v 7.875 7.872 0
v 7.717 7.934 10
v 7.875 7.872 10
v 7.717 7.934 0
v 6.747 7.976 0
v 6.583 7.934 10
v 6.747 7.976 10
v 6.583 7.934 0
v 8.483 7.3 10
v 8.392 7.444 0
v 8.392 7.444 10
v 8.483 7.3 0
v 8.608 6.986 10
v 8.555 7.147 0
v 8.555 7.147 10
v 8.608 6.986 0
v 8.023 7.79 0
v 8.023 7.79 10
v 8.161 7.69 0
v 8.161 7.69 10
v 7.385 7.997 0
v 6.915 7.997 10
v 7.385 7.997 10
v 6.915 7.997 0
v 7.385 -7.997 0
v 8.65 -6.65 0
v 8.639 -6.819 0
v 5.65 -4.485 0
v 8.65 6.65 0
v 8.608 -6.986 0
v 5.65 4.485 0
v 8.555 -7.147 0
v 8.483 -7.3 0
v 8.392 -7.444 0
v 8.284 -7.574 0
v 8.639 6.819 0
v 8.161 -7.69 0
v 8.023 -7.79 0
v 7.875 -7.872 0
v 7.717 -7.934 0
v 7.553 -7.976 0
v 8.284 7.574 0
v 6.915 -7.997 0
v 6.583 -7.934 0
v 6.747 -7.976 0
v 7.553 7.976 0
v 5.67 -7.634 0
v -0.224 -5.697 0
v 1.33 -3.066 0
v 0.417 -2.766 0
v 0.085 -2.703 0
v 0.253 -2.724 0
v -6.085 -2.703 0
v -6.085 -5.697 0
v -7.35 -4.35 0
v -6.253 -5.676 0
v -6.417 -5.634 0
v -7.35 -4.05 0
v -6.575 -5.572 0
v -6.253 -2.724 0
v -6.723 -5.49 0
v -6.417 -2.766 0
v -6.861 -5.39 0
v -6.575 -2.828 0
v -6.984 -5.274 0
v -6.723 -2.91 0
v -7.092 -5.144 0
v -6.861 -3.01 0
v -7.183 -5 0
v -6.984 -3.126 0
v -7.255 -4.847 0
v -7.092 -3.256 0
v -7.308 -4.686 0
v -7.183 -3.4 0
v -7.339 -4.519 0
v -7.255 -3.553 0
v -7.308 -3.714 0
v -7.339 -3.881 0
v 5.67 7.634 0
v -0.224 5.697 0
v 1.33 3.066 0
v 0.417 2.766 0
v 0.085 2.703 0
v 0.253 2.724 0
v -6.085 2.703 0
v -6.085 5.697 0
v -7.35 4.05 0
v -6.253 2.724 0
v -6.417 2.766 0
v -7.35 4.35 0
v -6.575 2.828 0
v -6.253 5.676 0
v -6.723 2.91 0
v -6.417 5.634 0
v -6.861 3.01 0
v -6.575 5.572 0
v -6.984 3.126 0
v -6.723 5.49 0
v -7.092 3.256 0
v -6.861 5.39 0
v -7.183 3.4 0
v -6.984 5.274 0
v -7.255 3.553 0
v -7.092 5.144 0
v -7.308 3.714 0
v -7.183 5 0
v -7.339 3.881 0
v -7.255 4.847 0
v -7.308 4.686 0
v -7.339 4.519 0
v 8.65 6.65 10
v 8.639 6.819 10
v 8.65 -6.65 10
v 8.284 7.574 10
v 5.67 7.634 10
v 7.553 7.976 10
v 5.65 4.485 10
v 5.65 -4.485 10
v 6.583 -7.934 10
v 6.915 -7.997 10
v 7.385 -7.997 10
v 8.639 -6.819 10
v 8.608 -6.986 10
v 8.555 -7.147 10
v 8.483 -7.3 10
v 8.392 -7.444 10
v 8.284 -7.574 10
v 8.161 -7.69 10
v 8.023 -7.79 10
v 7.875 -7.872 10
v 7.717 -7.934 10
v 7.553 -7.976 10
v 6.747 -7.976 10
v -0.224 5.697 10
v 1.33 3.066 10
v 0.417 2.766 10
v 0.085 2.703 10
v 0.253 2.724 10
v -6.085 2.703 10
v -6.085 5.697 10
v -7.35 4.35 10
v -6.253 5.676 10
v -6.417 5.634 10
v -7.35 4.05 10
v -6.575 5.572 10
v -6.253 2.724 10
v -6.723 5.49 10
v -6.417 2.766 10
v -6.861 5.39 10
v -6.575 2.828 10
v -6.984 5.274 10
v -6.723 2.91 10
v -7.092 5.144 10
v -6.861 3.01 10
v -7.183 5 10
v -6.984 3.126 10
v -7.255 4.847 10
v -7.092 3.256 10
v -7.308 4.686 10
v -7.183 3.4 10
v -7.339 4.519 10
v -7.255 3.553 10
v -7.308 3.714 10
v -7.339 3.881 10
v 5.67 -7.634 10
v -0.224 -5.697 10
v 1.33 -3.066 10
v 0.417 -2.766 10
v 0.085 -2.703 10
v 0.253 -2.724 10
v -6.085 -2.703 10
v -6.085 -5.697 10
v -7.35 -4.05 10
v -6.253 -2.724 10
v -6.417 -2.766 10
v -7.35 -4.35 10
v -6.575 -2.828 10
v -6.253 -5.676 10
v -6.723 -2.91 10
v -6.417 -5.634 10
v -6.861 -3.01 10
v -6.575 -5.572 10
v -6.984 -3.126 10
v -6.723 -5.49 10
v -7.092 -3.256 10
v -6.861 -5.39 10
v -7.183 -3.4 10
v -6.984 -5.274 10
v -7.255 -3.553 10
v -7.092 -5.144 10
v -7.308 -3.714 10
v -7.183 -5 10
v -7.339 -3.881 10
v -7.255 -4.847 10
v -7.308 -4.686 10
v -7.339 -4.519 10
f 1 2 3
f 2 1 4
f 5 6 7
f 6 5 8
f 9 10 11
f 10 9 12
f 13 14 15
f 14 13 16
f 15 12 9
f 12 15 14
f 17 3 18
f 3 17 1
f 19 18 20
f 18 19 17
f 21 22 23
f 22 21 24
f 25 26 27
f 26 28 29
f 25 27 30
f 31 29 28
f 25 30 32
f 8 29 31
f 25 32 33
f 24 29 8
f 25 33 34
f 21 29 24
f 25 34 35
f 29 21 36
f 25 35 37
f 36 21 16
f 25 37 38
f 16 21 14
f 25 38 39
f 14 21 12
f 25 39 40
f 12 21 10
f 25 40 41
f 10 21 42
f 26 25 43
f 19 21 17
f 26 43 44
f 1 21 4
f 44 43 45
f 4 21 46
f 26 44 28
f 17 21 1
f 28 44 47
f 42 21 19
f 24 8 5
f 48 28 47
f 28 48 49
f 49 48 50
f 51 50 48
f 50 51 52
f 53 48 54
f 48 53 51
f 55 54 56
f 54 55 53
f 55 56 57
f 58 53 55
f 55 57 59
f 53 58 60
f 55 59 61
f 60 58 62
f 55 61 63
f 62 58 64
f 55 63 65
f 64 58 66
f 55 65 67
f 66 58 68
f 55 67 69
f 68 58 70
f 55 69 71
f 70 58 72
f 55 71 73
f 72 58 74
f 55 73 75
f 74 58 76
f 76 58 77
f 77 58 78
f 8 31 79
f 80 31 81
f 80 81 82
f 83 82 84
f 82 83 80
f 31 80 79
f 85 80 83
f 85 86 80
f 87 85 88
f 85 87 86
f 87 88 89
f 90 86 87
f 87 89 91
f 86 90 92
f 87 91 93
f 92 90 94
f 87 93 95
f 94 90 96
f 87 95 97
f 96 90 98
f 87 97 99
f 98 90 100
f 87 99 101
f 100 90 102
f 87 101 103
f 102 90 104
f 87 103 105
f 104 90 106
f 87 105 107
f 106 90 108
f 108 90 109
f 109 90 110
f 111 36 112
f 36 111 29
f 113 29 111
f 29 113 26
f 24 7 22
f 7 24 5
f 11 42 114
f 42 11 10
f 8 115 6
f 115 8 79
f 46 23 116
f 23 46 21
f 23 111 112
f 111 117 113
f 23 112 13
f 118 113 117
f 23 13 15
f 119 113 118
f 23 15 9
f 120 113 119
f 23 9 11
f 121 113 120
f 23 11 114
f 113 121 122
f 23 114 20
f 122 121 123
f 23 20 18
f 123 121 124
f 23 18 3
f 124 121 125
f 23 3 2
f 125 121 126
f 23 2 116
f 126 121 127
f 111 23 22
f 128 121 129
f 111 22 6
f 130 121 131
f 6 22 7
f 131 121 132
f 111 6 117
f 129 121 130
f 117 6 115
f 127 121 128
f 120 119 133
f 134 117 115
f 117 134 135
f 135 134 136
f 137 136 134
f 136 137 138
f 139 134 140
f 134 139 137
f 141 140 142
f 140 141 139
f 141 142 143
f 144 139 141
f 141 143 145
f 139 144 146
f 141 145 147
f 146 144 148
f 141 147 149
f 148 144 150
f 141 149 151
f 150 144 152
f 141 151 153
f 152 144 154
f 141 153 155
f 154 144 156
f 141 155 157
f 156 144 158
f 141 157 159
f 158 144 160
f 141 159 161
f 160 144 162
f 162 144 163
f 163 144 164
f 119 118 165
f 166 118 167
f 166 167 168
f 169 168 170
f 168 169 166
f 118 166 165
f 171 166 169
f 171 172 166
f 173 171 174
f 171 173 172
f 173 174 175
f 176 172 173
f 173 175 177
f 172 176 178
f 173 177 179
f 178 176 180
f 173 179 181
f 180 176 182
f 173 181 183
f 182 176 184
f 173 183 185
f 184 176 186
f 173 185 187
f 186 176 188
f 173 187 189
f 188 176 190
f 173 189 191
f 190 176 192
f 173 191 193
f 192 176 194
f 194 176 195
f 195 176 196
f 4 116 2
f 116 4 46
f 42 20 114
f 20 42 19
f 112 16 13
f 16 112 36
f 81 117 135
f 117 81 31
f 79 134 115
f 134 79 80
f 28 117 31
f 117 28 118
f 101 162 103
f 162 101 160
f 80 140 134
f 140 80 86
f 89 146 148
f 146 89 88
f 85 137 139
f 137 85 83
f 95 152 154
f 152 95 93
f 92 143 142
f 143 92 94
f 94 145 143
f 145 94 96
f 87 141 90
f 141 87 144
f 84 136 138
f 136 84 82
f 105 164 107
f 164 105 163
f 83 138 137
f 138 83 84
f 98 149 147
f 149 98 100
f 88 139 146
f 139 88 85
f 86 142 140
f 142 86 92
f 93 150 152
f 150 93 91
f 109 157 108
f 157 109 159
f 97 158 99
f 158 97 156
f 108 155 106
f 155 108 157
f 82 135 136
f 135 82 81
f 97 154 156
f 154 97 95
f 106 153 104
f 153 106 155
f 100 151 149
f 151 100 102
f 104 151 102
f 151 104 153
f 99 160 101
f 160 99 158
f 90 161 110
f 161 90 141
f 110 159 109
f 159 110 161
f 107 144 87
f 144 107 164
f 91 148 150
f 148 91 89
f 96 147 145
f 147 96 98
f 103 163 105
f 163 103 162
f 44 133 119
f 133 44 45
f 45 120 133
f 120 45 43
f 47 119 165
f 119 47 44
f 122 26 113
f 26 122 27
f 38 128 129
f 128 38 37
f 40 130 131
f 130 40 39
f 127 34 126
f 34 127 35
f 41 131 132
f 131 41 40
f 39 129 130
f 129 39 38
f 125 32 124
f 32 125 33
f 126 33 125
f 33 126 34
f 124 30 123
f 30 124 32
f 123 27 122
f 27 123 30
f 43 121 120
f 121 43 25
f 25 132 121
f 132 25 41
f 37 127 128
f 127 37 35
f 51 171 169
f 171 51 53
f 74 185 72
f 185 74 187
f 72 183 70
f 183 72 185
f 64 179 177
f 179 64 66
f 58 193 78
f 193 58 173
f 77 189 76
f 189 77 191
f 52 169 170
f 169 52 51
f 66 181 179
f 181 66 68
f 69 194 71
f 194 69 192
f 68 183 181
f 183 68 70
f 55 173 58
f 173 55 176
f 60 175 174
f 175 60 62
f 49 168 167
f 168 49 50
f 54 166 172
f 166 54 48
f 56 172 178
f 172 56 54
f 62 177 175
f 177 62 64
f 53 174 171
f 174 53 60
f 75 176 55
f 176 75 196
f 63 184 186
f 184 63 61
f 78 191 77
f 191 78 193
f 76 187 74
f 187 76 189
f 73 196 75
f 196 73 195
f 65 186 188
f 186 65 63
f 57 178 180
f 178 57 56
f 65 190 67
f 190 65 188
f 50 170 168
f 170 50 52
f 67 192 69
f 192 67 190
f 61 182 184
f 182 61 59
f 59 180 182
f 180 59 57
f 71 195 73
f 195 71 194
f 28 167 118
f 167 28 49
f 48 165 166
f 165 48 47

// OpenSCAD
// preview[view:south, tilt:top]

// width of the clamp (mm)
width = 10;    

// thickness of the plastic (mm)
thickness = 3; 

// gap between tweezers (mm)
gap = 5.4;	 

// length of the pinching part (the tweezers, mm)
l1 = 6;

// length of the wider part (mm)
l2 = 7;

g2 = max(10, gap + 4);

r = 0.45 * thickness;
d = 0.1 * thickness;

hg = gap/2;
hg2 = g2/2;
$fn=50;

// the polygon that defines the cross-section of the clamp
p = [
	[ -l1, -hg - r],
	[ -l1, -hg - d - r],
	[ 0, -hg - d - r],
	[ l2, -hg2 - d - r],
	[ l2 + d, -hg2 - d - r],
	[ l2 + d, hg2 + d + r], 
	[ l2, hg2 + d + r],
	[ 0, hg + d + r],
	[ -l1, hg + d + r],
	[ -l1, hg + r],
	[ 0, hg + r],
	[l2, hg2 + r],
	[l2, -hg2 - r],
	[0, -hg - r]
];

minkowski()
{
linear_extrude( height = width/2)
	polygon( points = p, convexity = 40);
cylinder( r = r, h = width/2);
}
